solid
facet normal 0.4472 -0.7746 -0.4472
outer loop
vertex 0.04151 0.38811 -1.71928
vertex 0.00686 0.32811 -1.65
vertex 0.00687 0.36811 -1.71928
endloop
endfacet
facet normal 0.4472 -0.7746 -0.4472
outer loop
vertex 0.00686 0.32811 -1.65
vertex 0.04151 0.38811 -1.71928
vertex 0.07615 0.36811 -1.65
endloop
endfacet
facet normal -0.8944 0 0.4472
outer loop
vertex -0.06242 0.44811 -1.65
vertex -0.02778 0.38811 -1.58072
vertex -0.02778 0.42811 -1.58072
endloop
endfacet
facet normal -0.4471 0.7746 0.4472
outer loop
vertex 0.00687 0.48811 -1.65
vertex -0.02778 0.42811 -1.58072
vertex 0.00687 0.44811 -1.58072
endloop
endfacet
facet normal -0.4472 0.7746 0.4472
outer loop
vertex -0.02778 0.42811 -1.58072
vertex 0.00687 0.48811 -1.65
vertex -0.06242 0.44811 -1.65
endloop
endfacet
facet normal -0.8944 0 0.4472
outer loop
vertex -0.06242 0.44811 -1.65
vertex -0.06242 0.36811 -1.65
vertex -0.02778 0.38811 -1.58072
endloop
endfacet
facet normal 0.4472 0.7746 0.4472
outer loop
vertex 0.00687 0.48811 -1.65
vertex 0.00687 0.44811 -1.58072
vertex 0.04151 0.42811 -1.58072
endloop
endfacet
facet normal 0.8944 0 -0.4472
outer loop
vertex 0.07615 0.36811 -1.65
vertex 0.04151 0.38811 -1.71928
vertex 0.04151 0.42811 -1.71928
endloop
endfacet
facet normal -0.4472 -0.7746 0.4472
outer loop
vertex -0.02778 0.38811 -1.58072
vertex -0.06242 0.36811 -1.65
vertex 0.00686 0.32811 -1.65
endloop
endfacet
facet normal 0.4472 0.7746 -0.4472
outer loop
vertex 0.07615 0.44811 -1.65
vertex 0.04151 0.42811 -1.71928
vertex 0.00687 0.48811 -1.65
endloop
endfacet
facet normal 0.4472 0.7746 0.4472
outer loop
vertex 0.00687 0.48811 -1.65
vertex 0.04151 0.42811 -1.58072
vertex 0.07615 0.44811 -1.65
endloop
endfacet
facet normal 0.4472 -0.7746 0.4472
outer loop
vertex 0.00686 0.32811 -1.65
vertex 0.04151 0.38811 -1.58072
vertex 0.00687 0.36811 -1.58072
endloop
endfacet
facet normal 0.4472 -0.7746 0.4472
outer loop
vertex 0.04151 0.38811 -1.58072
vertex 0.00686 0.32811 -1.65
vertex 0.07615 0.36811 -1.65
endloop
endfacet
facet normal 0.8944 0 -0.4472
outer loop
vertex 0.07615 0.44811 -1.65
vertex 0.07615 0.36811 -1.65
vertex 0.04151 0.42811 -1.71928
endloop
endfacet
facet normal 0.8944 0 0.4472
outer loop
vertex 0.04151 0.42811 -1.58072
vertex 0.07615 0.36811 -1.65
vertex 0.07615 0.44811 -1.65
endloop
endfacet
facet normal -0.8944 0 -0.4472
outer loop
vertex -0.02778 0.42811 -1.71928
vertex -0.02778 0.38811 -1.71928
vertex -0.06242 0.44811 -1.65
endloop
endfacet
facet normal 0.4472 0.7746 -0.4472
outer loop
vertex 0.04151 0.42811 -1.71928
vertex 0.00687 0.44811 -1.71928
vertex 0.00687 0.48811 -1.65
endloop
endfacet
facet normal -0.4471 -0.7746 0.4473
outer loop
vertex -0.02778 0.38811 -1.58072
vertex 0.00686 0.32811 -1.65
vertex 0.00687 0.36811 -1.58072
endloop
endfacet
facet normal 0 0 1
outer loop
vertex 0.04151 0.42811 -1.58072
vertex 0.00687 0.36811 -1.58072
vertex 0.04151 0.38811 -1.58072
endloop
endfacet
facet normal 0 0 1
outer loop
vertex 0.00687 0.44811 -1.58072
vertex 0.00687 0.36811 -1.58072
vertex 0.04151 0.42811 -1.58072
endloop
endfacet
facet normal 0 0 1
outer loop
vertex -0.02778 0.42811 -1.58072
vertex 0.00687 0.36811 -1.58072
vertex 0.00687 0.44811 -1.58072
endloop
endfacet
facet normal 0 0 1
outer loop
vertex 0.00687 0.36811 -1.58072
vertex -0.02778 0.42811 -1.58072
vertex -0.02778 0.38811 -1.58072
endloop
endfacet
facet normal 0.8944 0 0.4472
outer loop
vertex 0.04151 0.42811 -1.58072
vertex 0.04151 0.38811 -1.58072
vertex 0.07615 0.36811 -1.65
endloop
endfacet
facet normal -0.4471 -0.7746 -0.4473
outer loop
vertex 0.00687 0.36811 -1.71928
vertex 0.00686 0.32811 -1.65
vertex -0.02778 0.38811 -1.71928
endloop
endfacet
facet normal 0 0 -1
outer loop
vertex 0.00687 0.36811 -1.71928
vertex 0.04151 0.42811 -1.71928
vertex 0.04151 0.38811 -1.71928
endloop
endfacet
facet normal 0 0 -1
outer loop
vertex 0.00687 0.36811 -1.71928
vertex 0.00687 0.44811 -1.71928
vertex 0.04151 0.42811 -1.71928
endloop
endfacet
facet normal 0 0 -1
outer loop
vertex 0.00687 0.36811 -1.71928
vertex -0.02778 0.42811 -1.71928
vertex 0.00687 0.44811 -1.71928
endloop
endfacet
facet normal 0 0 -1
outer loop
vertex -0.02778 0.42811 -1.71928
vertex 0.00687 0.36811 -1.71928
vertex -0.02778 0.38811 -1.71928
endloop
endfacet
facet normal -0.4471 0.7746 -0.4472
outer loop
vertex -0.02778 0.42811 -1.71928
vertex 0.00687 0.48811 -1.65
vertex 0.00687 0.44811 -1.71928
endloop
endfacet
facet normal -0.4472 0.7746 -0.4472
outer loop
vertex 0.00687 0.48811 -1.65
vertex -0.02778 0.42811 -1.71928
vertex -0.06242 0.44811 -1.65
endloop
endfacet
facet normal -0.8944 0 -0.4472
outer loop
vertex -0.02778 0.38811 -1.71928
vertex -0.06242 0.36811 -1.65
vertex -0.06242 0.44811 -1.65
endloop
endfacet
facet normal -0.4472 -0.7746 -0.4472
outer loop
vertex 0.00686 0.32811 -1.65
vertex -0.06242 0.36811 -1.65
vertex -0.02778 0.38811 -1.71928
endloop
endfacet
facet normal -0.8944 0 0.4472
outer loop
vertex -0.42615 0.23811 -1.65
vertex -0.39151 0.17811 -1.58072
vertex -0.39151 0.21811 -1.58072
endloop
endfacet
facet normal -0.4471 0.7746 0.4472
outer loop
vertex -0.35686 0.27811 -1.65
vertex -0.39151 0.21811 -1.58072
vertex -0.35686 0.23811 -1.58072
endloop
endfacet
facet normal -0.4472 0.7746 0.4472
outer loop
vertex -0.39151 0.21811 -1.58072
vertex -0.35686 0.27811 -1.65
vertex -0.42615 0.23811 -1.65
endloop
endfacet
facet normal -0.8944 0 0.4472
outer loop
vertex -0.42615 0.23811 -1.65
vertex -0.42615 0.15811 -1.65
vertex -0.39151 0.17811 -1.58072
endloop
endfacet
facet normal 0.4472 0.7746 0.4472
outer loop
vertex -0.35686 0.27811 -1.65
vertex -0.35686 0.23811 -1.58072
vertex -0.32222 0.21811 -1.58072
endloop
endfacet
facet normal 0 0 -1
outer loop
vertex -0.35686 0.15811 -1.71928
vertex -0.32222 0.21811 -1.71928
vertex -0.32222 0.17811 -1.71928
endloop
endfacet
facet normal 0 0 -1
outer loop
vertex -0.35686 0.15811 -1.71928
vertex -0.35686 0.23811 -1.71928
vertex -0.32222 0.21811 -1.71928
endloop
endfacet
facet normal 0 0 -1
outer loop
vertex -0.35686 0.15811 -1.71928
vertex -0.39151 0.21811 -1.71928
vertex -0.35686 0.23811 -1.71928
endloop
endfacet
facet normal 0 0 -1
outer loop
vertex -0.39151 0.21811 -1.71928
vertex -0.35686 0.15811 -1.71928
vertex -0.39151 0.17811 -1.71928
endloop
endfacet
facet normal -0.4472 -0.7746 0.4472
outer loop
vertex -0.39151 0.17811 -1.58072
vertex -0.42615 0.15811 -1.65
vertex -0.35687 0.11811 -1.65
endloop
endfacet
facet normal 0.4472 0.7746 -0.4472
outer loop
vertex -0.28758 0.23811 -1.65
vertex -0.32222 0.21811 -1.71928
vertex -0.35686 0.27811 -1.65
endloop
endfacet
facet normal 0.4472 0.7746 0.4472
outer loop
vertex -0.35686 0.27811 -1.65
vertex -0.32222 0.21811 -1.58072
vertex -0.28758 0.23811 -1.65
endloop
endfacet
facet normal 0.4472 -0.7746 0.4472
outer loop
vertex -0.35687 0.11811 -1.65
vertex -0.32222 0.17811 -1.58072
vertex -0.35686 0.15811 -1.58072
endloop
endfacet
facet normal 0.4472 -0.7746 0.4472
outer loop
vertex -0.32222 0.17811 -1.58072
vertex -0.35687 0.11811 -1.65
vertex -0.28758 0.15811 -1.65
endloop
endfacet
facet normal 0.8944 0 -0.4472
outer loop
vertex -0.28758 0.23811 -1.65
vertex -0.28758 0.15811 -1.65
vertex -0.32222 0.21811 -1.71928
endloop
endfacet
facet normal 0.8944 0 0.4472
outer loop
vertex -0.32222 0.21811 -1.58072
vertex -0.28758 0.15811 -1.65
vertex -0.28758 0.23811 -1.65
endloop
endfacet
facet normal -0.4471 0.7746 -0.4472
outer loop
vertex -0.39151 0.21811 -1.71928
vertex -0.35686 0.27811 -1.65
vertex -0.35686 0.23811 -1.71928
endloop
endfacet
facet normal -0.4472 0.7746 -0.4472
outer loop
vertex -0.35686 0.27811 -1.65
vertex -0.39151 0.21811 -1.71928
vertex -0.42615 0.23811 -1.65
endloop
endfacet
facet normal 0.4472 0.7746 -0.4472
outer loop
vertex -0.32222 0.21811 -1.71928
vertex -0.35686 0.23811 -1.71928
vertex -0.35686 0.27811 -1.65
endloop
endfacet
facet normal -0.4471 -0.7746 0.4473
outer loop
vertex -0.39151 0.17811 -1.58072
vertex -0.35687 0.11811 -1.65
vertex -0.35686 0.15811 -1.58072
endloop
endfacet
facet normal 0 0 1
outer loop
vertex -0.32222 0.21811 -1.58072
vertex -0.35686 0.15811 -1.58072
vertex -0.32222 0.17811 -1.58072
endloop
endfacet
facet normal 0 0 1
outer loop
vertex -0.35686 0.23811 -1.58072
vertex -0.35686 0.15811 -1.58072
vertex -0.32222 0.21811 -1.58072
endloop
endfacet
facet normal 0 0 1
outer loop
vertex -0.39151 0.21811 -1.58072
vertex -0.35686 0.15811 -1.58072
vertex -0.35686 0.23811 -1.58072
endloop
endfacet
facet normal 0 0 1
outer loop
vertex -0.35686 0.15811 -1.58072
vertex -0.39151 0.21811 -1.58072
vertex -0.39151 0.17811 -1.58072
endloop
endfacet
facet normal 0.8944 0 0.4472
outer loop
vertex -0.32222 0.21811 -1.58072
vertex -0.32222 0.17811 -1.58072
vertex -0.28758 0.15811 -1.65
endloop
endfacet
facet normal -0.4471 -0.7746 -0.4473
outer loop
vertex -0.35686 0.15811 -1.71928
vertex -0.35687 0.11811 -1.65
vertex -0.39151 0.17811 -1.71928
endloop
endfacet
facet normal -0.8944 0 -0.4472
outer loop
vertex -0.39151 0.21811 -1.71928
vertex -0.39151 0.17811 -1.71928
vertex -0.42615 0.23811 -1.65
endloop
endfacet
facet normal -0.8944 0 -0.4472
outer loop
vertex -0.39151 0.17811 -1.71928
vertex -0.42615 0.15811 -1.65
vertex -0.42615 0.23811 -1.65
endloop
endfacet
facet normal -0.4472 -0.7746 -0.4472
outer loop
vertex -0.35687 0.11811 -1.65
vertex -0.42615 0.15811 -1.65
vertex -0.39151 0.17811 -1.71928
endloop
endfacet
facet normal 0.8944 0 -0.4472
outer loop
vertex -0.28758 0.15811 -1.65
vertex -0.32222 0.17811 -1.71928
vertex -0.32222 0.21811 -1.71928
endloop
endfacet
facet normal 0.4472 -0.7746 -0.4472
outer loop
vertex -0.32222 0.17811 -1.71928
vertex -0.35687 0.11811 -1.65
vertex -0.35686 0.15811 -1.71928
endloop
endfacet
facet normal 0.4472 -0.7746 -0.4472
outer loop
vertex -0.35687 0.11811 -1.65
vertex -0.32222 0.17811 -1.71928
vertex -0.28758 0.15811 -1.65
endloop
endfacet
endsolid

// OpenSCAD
$fa = 1;
$fs = 0.1;

rotate([0,0,30])
translate([0,0,0.75])
rotate([0,0,0]) {

translate([-0.2,0,-0.1]) {
// right leg    
//cylinder(1.2,0.2, 0.1);

// right shoe    
//translate([0,0.2, 1.2])
//scale([0.2,0.4,0.1])
//sphere(1);
}

translate([0.2,0,-0.1]) {
// left leg    
//cylinder(1.2,0.2, 0.1);

// left shoe    
//translate([0,0.2, 1.2 ])
//scale([0.2,0.4,0.1])
//sphere(1);
}

// torso
//translate([0,0,-0.8])
//scale([0.6,0.4,1])
//sphere(1);

// neck
//translate([0,0,-2])
//cylinder(0.3,0.2,0.2);

// head
//translate([0,0,-2.3])
//sphere(0.4);

// right arm
//translate([-0.6,0,-1.4])
//rotate([0,-10,0])
//cylinder(1,0.2,0.1);

// left arm
//translate([0.6,0,-1.4])
//rotate([0,10,0])
//cylinder(1,0.2,0.1);

// shoulders
//translate([0,0,-1.45])
//scale([0.8,0.3,0.3])
//sphere(1);

// right hand
//translate([-0.8,0,-0.3])
//scale([1,0.5,1])
//sphere(0.2);

// left hand
//translate([0.8,0,-0.3])
//scale([1,0.5,1])
//sphere(0.2);

// nose
//translate([0,0.35,-2.2])
//scale([0.5,1,0.5])
//  sphere(0.2);

// left eye
translate([0.21,0.35,-2.4])
  sphere(0.08);
  
// right eye  
translate([-0.21,0.35,-2.4])
  sphere(0.08);
}
